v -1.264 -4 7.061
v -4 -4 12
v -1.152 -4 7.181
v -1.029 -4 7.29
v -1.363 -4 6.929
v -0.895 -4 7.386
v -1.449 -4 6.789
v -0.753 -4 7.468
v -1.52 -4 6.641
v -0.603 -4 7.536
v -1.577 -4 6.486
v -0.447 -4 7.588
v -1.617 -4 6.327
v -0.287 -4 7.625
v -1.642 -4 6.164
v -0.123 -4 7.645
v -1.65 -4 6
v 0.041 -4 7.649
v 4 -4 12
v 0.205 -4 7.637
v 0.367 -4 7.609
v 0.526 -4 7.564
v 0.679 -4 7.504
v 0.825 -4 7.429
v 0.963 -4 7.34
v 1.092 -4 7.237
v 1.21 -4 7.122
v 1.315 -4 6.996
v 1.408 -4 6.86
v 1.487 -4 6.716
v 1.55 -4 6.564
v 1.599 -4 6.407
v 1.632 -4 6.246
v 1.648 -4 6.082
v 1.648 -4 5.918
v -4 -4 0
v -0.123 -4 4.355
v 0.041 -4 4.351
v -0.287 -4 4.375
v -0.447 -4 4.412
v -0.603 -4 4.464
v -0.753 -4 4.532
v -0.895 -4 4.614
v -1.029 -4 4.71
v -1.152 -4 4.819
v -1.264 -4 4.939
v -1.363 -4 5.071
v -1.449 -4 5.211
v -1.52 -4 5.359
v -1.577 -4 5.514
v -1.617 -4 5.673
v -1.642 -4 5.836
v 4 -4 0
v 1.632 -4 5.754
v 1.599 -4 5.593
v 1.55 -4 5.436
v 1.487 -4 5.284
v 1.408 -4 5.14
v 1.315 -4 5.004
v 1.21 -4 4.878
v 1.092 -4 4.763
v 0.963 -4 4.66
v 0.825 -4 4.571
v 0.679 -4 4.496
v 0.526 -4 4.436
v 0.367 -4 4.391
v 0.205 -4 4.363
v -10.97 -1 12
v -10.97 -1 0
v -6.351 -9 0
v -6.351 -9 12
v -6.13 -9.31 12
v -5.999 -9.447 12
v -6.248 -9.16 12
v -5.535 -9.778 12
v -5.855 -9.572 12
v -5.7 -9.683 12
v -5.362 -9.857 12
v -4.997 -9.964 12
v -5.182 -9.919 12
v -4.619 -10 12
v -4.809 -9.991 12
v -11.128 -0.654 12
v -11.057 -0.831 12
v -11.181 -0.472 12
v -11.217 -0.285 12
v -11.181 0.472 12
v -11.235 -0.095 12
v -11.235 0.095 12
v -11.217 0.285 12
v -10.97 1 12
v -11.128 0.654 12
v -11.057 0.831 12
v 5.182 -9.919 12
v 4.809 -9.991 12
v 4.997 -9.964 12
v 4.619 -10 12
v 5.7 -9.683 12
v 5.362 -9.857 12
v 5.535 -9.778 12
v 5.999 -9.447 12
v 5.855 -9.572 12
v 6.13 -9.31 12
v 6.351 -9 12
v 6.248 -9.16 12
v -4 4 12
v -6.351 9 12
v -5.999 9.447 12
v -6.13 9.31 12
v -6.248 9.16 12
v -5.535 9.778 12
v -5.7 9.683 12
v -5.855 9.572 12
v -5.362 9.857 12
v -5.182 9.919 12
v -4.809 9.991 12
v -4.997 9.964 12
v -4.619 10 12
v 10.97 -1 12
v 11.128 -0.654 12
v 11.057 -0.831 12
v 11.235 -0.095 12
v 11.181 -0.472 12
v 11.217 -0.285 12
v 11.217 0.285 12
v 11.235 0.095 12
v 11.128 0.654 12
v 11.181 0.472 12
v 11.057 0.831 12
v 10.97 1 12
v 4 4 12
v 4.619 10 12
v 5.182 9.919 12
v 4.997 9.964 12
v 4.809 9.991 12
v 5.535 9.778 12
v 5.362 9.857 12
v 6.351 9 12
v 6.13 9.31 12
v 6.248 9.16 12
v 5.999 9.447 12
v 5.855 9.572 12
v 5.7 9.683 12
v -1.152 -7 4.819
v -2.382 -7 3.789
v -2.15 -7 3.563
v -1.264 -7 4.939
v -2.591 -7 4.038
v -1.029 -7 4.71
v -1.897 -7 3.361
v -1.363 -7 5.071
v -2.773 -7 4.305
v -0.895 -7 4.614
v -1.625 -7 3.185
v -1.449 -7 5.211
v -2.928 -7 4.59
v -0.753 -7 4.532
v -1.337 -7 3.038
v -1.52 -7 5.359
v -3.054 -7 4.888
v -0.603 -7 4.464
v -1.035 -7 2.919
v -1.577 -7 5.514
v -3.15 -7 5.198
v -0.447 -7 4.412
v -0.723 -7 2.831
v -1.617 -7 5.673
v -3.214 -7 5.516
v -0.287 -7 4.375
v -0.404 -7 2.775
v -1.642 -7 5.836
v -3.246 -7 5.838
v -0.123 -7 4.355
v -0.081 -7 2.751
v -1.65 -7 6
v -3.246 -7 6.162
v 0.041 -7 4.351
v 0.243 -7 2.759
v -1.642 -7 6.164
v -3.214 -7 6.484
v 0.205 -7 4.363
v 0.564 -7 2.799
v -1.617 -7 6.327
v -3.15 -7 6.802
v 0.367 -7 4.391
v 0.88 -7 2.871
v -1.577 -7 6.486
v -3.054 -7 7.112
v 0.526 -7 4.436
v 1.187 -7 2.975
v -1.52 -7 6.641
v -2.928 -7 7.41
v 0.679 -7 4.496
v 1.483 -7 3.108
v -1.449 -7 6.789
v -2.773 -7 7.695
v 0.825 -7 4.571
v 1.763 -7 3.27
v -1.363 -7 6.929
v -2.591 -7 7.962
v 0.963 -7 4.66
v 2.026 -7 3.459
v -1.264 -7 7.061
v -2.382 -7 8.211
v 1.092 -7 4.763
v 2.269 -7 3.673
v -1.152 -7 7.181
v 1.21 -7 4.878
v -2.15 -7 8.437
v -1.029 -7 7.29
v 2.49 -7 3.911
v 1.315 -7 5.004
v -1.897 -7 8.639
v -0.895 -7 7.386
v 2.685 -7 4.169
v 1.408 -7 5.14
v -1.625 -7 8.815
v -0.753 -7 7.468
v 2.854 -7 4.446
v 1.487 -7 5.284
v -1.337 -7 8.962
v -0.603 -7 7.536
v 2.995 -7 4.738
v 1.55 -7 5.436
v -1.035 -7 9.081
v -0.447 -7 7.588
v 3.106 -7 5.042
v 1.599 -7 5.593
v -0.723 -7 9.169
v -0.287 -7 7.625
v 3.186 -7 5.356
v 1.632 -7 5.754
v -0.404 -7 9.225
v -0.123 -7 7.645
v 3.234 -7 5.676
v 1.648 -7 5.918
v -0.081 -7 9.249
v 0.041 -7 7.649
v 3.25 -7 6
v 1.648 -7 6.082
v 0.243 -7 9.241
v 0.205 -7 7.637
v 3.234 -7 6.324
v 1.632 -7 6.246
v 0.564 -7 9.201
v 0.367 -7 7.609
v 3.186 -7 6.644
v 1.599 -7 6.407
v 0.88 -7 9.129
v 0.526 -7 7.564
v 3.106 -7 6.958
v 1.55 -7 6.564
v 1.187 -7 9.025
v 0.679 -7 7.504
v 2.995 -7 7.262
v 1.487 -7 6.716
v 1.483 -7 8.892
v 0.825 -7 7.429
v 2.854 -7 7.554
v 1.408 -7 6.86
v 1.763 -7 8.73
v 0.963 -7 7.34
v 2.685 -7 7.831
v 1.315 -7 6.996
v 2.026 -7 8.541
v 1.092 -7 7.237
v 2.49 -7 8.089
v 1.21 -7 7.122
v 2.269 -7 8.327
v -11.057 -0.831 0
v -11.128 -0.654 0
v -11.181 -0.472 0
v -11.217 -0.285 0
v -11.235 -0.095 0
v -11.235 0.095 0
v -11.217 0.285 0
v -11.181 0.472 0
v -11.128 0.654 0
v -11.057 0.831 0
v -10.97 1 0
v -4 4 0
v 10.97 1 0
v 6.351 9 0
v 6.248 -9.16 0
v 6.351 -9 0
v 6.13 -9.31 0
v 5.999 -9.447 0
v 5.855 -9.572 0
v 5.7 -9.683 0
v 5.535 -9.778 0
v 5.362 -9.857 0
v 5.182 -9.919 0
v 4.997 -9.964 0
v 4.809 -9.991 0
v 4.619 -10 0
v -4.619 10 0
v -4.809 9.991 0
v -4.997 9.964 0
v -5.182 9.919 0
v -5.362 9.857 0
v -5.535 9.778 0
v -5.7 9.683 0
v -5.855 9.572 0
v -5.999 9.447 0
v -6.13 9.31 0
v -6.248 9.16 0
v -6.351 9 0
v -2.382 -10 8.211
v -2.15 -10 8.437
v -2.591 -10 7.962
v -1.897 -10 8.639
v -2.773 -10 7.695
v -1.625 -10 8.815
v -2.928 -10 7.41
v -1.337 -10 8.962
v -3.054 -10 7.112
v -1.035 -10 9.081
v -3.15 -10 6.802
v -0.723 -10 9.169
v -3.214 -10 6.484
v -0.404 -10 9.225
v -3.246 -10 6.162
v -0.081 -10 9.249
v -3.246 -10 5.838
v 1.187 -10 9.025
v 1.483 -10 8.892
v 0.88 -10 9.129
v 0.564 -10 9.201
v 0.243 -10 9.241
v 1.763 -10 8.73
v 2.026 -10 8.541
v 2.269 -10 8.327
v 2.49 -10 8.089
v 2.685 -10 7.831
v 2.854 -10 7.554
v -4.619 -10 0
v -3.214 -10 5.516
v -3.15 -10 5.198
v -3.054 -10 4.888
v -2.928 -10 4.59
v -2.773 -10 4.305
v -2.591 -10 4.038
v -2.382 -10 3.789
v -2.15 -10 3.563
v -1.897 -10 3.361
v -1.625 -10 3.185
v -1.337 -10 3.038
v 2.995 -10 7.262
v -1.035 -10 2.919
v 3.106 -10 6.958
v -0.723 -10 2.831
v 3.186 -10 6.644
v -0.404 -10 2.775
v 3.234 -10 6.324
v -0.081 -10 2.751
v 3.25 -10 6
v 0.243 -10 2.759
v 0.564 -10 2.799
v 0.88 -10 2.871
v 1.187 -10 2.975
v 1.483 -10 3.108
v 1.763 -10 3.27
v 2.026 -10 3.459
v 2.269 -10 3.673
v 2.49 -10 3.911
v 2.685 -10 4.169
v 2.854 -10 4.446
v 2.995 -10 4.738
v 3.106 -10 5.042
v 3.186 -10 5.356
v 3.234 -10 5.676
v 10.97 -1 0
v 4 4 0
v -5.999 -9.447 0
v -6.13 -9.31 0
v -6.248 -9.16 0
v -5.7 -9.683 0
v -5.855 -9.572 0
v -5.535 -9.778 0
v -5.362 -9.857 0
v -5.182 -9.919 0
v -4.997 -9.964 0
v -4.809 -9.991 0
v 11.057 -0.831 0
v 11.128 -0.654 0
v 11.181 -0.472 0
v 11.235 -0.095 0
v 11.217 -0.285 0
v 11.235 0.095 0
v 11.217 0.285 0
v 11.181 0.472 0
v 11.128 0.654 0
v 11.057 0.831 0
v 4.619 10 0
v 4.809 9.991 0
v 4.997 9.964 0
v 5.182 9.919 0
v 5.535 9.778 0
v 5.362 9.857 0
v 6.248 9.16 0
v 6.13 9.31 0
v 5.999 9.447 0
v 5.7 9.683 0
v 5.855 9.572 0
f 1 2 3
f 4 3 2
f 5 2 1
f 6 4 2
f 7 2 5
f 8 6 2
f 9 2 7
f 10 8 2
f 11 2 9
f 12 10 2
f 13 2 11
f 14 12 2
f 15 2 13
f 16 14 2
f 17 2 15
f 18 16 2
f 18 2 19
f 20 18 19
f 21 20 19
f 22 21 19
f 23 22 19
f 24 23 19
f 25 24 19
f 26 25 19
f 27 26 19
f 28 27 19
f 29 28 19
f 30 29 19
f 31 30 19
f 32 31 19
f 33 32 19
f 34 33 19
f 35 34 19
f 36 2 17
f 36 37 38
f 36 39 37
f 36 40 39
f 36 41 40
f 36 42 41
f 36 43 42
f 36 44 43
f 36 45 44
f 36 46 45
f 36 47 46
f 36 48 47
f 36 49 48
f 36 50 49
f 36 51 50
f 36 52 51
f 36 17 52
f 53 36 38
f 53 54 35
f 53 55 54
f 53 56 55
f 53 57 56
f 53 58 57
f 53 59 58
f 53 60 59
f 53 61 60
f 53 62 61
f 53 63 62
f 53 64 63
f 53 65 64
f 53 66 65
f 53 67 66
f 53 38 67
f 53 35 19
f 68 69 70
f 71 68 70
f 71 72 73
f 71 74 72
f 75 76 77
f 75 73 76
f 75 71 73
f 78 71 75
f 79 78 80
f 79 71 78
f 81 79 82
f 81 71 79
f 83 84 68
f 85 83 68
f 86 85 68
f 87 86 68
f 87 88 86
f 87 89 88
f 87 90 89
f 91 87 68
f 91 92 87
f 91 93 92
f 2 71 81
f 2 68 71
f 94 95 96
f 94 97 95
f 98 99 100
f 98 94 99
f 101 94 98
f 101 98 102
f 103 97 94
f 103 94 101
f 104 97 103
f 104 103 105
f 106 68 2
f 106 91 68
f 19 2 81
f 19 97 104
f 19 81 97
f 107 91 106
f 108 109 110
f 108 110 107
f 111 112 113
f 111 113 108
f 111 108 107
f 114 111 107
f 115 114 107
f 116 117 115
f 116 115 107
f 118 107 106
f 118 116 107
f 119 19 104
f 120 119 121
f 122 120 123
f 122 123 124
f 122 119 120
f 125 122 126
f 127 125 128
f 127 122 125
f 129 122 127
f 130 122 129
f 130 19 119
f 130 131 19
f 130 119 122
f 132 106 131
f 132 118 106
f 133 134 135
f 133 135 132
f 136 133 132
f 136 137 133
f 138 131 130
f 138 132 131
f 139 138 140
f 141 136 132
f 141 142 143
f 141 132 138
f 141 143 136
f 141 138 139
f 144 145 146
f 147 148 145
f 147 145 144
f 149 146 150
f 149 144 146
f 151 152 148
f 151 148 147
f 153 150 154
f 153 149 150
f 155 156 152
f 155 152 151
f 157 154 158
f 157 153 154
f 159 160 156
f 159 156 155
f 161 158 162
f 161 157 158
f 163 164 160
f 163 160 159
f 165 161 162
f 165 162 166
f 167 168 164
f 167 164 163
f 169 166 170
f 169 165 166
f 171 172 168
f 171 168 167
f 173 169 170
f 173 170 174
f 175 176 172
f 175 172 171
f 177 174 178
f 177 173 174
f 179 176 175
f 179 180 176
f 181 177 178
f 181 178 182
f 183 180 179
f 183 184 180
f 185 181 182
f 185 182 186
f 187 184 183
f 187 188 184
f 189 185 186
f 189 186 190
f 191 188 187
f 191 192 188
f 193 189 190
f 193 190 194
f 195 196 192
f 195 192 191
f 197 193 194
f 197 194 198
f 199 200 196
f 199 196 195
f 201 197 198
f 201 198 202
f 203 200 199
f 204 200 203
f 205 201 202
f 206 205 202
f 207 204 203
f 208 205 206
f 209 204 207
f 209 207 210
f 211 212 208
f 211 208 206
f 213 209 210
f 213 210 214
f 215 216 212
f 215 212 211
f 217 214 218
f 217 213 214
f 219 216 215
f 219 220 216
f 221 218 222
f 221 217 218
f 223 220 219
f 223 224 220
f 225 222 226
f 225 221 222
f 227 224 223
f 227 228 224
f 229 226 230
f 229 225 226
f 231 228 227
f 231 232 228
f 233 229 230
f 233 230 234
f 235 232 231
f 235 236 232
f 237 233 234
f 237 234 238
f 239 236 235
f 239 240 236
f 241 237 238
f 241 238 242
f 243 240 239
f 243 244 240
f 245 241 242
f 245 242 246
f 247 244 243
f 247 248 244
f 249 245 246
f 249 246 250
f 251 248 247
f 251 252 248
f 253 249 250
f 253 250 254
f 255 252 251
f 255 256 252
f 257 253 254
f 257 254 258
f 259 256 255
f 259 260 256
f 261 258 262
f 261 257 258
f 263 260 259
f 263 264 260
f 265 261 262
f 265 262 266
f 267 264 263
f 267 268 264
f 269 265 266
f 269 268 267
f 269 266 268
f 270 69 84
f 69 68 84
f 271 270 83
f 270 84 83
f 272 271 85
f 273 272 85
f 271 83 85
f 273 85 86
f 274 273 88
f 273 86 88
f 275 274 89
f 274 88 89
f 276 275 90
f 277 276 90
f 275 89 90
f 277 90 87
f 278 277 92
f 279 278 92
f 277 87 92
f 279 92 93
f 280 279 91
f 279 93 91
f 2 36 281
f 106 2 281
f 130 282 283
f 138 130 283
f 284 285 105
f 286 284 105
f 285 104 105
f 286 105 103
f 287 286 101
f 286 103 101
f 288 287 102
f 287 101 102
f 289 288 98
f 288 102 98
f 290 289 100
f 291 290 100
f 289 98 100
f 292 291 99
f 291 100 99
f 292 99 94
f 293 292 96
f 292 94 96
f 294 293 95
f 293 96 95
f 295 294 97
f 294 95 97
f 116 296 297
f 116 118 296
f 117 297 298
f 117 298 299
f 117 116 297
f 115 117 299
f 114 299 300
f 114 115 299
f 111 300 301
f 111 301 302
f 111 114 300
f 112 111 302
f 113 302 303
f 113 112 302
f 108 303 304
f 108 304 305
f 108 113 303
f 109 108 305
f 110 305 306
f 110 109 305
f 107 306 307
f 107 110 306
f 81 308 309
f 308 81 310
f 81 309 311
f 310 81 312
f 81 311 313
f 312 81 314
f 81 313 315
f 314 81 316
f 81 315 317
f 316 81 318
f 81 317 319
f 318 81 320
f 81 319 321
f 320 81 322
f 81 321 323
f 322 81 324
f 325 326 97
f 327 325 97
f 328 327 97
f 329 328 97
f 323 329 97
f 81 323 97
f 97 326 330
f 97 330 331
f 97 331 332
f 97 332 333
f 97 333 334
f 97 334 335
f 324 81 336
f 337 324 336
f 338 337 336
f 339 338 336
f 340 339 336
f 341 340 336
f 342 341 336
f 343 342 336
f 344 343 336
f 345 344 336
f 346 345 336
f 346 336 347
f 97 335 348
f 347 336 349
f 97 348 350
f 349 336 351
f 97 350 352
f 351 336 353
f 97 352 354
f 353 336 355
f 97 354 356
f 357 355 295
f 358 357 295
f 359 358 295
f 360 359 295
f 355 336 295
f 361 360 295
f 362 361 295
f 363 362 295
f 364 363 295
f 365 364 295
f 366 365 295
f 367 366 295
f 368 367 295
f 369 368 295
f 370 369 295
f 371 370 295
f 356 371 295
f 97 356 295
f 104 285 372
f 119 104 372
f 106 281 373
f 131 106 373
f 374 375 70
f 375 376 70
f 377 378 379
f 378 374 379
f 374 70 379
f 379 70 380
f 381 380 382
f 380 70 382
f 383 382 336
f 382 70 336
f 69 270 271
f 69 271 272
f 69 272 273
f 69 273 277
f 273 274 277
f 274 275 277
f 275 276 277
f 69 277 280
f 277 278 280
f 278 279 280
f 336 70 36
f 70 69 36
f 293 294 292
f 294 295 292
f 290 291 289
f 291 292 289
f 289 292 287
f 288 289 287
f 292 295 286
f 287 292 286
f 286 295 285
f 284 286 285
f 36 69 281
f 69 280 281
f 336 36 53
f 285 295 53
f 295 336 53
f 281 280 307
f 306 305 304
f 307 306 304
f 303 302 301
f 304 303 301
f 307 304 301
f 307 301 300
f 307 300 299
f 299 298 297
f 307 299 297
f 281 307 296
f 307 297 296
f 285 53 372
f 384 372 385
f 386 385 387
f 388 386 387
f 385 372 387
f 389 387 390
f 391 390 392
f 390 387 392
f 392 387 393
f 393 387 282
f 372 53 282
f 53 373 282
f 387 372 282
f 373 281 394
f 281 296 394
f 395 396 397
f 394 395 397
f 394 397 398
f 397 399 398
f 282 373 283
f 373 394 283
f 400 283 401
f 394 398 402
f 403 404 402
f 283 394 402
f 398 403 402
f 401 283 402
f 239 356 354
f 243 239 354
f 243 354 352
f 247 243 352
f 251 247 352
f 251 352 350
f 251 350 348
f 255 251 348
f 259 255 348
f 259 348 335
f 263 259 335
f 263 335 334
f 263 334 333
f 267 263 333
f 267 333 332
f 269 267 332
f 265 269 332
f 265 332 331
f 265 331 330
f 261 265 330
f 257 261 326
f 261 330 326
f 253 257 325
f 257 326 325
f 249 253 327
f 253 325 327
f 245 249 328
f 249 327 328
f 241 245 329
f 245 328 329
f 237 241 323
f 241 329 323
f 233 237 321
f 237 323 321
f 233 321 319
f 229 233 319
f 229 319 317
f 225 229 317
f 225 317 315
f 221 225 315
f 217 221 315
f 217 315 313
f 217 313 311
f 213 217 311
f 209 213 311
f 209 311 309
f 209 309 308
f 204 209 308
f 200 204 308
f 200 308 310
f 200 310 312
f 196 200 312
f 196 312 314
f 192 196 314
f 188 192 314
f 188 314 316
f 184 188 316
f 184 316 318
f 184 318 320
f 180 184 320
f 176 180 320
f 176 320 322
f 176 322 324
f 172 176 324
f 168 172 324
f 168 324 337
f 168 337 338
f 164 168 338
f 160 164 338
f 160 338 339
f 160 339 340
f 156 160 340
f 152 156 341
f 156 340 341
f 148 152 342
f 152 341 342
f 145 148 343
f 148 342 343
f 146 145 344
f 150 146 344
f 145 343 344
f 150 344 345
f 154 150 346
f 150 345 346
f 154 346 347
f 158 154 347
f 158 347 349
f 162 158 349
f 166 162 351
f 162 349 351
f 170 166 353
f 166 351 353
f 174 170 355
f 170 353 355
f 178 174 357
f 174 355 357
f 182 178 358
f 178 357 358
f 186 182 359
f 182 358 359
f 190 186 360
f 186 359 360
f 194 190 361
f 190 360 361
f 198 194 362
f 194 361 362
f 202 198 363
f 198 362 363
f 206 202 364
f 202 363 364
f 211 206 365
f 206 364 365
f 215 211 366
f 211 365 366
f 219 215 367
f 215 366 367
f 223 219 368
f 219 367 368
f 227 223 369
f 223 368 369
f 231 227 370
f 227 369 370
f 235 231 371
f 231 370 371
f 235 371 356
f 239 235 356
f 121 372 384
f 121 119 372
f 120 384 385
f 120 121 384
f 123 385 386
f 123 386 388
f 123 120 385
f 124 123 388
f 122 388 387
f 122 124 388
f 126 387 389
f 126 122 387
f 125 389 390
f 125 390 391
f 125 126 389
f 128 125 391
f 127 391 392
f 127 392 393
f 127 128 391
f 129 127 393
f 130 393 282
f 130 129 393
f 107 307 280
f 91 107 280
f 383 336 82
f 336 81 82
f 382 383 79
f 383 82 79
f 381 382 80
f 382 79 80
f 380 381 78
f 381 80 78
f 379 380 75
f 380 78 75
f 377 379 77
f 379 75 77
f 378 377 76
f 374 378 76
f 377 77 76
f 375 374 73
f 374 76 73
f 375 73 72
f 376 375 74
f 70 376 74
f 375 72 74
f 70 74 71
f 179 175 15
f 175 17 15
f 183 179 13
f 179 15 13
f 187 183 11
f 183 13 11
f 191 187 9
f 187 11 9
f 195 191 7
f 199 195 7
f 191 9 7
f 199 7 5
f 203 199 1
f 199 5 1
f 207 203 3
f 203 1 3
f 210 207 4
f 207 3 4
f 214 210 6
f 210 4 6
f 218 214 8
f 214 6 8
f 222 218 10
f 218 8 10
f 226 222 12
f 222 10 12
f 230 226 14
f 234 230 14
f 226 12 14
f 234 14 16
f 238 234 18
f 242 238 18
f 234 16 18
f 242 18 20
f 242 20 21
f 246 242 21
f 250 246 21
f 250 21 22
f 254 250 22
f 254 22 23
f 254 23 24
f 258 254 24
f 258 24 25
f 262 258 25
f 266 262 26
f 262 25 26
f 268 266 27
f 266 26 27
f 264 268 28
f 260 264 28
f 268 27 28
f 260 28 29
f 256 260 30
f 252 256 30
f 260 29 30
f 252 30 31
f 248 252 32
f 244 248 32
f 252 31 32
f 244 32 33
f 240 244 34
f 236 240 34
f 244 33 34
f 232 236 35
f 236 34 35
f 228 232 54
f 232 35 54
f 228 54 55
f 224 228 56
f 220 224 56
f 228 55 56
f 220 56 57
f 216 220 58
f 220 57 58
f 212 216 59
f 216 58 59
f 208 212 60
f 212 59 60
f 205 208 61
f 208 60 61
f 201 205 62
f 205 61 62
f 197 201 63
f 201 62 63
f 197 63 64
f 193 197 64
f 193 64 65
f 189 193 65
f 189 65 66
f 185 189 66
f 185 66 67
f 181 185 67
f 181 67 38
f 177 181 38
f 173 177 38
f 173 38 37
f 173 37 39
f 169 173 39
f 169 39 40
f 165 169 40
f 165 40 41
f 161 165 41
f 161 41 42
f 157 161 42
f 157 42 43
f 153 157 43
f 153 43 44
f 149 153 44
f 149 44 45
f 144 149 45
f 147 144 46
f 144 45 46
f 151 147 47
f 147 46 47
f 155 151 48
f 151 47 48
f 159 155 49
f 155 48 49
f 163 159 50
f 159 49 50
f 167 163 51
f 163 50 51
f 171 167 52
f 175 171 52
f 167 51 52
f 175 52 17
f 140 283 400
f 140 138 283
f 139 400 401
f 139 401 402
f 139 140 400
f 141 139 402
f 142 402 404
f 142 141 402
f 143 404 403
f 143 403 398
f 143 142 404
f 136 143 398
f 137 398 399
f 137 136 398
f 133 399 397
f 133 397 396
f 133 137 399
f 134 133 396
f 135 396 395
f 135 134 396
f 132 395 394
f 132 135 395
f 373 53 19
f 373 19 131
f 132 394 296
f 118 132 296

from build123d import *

# Parameters (mm, degrees)
F0_W           = 8
F0_H           = 8
F1_DEPTH       = 12
F3_D           = 3.3
F3_DEPTH       = 12
F3_CBORE_D     = 6.5
F3_CBORE_DEPTH = 3
F3_TIP         = 0.9914200214
F4_R           = 2


with BuildPart() as f1:
    # F0 (on Top) → F1 (new body)
    with BuildSketch(Plane.XY):
        Polygon((5.7735026919, -10), (11.5470053838, 0), (5.7735026919, 10), (-5.7735026919, 10), (-11.5470053838, 0), (-5.7735026919, -10), align=None)
        Rectangle(F0_W, F0_H, mode=Mode.SUBTRACT)
    extrude(amount=F1_DEPTH)

    # F3
    with Locations(Plane.XZ.offset(10)):
        with Locations((0, 6)):
            CounterBoreHole(F3_D / 2, F3_CBORE_D / 2, F3_CBORE_DEPTH, depth=F3_DEPTH)
            with Locations((0, 0, -(F3_DEPTH + F3_TIP / 2))):  # 118° drill point
                Cone(0, F3_D / 2, F3_TIP, mode=Mode.SUBTRACT)

    # F4
    f4_edges = [f1.edges().sort_by_distance(p)[0] for p in [
        (-11.547005, 0, 6),
        (-5.773503, -10, 6),
        (5.773503, -10, 6),
        (11.547005, 0, 6),
        (5.773503, 10, 6),
        (-5.773503, 10, 6),
    ]]
    fillet(f4_edges, radius=F4_R)


solid = f1.part
